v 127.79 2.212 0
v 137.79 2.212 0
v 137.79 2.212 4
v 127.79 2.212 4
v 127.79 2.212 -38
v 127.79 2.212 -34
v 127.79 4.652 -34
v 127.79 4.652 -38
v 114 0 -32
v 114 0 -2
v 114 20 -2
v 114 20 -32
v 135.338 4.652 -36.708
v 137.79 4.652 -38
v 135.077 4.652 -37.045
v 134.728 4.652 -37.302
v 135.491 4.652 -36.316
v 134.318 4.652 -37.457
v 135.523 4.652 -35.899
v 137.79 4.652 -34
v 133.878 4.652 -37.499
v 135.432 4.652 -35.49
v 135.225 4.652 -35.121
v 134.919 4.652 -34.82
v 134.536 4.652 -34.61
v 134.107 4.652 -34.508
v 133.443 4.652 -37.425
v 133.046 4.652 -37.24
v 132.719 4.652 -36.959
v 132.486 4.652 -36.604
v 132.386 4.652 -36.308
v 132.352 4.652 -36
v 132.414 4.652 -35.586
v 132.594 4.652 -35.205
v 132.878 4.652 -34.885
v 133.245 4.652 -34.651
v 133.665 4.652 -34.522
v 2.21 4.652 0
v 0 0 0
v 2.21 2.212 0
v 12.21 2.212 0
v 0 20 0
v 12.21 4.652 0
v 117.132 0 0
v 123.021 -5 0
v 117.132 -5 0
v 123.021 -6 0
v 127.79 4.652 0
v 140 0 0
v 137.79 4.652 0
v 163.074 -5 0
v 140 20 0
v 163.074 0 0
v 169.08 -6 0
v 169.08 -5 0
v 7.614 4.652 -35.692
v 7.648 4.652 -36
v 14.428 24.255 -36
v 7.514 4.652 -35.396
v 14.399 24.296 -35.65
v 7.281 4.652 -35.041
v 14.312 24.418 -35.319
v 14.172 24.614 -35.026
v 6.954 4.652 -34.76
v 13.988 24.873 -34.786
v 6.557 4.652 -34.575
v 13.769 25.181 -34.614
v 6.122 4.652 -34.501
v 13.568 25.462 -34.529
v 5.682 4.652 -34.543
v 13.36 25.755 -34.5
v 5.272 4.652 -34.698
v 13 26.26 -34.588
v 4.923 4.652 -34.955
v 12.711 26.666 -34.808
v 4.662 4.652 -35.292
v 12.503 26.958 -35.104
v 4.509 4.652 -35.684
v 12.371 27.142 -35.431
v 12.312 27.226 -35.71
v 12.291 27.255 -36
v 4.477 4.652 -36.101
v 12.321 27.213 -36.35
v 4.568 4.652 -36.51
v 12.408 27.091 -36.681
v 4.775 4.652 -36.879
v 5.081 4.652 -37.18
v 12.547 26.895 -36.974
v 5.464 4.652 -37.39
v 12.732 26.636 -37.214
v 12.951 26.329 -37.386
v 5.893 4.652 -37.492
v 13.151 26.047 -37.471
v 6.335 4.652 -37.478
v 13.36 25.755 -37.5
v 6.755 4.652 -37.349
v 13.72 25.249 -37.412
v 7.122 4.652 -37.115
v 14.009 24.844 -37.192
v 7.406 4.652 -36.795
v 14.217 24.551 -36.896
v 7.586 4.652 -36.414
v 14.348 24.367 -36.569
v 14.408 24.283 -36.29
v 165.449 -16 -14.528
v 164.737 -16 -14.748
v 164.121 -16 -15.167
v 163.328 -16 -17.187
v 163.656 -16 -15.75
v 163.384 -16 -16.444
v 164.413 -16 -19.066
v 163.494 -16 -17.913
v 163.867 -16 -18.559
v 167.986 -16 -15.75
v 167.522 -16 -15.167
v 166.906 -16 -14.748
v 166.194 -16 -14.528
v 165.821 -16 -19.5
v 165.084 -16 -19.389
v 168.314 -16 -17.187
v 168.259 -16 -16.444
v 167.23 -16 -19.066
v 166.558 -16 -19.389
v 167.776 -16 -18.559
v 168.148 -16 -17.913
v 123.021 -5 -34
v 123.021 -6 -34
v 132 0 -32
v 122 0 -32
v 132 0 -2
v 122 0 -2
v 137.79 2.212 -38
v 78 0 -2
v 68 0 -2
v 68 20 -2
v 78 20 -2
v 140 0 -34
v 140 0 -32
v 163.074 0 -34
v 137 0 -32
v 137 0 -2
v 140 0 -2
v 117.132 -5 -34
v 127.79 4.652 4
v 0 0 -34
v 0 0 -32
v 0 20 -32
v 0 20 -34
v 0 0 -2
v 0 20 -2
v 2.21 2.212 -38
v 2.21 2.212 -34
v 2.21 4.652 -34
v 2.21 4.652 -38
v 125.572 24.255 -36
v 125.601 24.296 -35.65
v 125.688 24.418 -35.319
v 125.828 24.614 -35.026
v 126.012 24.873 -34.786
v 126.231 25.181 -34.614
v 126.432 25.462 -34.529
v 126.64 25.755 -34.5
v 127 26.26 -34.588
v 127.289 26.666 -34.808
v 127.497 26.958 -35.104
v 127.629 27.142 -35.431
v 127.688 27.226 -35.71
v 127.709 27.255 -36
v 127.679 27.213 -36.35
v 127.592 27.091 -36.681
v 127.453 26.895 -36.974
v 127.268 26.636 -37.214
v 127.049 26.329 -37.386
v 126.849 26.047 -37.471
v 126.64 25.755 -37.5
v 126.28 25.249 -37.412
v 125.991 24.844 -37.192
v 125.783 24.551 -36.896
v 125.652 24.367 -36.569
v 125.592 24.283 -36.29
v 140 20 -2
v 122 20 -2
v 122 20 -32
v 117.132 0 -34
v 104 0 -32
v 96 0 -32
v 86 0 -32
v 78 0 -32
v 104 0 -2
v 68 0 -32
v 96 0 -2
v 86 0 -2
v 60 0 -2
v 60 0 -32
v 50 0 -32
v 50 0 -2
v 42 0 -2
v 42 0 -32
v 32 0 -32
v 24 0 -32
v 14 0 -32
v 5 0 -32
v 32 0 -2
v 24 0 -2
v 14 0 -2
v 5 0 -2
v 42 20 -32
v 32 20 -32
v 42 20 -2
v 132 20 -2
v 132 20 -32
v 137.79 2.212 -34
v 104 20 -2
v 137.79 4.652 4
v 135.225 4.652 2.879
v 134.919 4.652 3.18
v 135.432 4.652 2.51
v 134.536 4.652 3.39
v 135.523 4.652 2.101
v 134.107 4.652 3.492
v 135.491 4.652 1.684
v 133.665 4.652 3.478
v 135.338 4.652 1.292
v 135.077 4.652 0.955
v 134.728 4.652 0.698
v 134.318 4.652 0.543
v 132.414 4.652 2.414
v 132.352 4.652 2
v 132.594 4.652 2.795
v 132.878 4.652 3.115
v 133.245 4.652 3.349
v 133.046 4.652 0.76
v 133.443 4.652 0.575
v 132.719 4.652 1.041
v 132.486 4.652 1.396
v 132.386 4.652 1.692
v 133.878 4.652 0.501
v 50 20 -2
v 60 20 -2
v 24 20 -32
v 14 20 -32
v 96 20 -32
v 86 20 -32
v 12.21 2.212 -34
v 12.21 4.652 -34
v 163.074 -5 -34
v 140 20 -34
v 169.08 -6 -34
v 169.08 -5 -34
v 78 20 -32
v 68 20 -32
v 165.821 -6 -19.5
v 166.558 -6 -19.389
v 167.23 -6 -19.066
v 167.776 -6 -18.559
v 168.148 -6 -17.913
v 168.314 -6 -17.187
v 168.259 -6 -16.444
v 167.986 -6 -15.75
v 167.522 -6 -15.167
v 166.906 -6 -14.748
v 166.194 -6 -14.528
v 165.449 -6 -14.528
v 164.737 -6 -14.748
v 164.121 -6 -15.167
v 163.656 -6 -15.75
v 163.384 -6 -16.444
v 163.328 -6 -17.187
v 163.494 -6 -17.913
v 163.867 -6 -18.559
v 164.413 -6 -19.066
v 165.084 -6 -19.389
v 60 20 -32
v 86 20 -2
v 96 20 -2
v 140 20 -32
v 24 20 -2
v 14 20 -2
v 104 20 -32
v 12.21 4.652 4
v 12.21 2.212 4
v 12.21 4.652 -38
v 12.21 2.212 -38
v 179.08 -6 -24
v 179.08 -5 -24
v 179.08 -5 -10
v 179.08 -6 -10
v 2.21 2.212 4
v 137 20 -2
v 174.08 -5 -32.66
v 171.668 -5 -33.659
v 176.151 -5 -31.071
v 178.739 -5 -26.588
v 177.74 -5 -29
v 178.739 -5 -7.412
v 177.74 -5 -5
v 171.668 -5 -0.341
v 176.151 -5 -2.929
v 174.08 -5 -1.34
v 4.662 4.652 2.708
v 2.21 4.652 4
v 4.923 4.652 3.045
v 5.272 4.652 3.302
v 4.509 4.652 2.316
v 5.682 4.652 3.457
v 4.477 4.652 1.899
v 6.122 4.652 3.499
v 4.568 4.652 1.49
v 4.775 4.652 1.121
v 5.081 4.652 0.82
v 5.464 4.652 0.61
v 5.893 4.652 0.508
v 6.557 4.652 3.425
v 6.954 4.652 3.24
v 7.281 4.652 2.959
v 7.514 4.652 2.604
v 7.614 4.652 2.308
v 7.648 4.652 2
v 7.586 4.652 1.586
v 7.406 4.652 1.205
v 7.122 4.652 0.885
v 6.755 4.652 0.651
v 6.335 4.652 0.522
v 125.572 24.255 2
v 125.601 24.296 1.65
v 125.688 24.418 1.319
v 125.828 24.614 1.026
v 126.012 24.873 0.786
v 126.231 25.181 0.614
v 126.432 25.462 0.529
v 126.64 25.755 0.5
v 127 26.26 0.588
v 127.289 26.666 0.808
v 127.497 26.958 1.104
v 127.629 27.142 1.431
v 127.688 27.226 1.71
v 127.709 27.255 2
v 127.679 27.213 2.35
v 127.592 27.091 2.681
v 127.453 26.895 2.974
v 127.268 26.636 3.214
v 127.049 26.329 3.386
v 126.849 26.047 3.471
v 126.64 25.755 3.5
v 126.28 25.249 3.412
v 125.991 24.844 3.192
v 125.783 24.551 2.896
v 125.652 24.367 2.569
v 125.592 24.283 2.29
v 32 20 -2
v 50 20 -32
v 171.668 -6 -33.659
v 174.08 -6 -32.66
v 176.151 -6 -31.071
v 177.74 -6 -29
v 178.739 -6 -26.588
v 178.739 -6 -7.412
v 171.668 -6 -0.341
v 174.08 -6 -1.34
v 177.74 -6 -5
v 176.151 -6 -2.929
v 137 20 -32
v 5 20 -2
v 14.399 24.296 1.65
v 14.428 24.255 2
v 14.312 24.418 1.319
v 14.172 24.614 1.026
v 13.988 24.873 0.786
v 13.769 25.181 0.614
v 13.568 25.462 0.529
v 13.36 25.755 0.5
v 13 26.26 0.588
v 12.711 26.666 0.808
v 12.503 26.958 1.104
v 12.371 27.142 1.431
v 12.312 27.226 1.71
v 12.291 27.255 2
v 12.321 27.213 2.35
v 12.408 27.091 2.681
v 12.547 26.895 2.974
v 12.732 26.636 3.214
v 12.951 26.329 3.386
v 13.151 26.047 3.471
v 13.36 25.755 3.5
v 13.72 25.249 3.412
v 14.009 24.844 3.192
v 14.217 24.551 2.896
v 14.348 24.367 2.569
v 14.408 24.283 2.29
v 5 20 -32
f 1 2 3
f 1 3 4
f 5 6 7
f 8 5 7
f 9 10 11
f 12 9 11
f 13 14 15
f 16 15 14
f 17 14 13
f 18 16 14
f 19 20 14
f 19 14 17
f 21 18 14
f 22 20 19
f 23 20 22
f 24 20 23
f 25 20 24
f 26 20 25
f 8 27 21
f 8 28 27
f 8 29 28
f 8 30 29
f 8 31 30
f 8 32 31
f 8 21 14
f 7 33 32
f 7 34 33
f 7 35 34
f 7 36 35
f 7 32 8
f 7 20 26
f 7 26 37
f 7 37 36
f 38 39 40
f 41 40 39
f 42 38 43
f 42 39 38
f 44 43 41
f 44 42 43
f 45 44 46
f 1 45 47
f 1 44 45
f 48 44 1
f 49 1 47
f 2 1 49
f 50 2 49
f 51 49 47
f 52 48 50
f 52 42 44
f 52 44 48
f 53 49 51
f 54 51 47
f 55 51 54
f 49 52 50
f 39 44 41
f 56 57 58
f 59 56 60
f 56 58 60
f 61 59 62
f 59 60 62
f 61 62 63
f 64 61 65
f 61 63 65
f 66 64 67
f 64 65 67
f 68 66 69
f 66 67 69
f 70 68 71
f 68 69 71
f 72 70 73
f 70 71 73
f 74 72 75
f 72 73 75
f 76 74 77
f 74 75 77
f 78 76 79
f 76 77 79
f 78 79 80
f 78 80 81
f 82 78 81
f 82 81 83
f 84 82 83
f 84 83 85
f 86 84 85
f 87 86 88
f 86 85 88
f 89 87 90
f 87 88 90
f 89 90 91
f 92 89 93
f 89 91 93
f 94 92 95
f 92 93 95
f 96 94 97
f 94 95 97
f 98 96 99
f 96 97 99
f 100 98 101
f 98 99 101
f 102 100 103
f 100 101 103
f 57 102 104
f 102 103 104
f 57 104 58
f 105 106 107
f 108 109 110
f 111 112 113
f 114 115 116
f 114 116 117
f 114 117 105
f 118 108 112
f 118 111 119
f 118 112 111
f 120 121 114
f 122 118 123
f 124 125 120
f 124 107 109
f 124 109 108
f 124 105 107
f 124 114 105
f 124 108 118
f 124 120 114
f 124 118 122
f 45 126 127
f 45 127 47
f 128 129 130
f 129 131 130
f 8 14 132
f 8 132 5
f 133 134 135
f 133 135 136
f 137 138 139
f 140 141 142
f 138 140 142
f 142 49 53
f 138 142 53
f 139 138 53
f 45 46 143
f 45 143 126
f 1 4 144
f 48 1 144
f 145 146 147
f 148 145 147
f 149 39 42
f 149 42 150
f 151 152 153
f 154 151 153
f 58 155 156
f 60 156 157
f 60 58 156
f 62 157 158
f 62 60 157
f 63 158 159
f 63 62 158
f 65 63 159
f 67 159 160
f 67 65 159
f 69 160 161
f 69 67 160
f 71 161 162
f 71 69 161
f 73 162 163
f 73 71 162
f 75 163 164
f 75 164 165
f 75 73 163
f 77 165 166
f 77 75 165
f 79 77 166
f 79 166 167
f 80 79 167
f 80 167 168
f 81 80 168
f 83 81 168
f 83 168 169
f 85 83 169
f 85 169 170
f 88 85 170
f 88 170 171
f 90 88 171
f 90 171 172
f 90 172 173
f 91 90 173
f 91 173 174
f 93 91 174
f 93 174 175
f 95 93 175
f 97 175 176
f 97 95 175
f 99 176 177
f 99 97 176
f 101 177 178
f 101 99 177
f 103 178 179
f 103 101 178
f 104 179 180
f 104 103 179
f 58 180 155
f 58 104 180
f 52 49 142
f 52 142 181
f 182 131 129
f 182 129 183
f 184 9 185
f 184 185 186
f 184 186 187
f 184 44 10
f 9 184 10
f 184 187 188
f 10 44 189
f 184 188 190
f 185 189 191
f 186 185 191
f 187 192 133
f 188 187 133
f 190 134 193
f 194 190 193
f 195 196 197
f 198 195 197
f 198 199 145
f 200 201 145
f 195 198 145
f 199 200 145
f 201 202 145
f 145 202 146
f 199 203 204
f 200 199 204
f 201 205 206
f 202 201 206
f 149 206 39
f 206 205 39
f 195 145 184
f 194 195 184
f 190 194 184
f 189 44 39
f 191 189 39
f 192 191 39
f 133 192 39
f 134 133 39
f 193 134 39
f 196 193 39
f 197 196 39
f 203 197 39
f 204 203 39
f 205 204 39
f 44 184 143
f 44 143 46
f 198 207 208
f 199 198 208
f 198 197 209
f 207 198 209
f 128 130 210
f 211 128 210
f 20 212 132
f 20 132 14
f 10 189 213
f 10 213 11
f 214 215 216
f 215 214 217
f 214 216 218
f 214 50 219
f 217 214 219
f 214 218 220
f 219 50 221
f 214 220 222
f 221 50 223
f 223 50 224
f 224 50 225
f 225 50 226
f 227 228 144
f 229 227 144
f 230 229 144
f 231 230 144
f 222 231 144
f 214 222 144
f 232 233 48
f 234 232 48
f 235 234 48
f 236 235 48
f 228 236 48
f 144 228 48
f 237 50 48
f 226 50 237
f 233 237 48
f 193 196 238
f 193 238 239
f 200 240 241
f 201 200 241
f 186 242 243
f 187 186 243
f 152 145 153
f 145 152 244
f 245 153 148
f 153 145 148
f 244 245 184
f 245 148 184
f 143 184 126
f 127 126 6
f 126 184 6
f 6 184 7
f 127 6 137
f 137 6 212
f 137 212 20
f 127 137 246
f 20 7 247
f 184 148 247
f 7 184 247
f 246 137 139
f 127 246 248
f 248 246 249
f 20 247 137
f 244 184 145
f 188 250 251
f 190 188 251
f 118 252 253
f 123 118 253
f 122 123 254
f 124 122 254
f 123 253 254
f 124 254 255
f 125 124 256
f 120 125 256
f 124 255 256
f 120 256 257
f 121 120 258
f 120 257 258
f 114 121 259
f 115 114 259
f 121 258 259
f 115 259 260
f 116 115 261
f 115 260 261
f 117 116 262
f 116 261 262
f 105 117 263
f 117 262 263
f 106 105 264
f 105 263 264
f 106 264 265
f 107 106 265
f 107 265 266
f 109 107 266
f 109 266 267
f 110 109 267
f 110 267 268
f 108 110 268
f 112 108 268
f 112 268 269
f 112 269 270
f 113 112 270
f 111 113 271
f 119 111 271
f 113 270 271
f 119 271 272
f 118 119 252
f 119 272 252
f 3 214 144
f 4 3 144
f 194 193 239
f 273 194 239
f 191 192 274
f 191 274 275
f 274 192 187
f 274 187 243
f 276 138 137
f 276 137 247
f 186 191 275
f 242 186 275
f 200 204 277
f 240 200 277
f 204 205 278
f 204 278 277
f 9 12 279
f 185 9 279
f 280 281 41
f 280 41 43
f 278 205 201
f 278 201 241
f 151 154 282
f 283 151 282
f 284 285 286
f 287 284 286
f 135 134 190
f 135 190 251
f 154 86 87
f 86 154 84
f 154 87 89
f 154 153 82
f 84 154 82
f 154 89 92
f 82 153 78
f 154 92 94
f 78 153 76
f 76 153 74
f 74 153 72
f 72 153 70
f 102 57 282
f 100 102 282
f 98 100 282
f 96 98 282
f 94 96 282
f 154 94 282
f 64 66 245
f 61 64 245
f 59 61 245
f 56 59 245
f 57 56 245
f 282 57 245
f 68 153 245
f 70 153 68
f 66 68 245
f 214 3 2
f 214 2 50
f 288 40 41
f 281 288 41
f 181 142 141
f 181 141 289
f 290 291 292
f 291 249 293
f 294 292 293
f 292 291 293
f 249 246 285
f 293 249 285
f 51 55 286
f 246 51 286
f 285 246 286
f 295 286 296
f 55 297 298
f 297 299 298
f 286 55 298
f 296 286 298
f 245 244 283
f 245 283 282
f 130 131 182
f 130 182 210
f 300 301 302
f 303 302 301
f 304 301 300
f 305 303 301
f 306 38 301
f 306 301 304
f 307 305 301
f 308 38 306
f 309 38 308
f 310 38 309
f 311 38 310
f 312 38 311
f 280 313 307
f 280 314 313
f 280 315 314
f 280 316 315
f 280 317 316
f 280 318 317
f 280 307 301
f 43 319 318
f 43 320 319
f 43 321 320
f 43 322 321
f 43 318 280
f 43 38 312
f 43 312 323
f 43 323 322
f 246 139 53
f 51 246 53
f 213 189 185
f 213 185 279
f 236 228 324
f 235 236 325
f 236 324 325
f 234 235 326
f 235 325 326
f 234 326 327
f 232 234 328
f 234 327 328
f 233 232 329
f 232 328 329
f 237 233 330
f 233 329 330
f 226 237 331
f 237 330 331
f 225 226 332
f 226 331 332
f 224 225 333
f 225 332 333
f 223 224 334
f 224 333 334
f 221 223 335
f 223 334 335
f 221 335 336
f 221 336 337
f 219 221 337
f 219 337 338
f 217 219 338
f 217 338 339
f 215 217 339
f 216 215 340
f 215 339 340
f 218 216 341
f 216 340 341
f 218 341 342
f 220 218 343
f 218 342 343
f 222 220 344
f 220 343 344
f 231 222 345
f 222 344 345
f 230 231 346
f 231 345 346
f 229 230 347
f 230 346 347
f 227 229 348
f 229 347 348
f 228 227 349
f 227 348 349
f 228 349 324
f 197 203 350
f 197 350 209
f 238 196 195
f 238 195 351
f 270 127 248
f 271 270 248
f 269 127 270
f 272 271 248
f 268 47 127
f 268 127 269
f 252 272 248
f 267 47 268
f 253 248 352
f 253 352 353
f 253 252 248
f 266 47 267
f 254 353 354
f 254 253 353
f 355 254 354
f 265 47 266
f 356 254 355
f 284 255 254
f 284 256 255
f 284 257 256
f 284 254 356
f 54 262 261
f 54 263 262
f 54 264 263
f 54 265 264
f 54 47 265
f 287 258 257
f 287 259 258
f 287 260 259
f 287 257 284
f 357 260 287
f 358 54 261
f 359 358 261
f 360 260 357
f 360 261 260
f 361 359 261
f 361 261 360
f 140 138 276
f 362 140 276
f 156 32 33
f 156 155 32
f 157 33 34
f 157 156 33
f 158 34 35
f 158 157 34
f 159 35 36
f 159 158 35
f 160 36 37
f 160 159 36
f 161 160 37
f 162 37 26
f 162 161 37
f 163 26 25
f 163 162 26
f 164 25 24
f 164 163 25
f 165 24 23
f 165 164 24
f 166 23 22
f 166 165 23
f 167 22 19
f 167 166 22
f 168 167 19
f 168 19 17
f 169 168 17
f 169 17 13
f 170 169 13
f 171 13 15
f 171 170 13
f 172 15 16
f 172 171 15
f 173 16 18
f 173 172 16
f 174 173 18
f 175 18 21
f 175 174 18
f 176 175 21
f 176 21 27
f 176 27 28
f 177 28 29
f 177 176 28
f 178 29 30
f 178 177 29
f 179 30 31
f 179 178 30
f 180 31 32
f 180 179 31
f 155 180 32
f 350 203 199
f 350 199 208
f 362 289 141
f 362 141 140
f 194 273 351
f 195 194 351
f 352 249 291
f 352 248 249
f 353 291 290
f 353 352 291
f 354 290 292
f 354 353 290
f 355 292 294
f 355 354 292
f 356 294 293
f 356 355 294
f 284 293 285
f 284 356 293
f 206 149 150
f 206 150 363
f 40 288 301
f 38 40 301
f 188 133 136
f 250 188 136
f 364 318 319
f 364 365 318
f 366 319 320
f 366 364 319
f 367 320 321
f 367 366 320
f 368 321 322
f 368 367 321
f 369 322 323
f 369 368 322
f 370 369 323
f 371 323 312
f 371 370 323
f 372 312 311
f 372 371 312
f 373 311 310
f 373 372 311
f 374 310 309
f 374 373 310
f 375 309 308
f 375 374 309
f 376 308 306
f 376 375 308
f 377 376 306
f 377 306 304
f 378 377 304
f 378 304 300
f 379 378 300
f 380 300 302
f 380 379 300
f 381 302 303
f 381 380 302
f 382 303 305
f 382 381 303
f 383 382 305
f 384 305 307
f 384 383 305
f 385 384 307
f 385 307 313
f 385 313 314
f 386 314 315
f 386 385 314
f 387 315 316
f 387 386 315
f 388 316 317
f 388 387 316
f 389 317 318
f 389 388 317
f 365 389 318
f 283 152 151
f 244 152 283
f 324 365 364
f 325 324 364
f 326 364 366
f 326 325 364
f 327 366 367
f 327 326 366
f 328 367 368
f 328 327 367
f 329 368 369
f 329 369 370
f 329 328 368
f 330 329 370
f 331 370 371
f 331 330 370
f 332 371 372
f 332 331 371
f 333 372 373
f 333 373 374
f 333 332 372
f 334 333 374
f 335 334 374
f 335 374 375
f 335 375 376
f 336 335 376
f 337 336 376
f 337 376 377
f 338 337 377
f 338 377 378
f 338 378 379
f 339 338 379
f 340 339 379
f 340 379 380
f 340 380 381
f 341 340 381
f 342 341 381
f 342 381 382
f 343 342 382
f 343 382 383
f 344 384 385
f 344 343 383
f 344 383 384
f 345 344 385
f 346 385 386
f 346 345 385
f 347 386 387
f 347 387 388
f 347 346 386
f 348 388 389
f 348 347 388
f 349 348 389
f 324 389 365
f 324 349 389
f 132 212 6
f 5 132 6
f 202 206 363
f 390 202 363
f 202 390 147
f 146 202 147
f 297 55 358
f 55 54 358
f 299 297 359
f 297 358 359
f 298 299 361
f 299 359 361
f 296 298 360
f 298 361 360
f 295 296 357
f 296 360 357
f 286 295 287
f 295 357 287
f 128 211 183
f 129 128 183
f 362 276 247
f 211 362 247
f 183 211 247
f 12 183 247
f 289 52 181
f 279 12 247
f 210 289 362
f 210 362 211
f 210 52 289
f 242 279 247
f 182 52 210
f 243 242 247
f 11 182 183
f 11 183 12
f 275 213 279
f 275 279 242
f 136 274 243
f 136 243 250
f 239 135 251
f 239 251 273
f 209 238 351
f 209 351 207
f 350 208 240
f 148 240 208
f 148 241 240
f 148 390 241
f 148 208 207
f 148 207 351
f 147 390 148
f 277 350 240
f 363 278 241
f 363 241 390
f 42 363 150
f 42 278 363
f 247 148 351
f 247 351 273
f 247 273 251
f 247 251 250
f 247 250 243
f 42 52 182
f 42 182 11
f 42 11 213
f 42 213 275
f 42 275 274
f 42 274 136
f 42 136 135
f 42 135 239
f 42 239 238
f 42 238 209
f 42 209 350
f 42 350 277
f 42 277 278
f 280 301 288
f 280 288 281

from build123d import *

# Parameters (mm, degrees)
SKETCH1_W                = 140
SKETCH1_H                = 2
BOSS_EXTRUDE3_DEPTH      = 20
SKETCH3_W                = 8
SKETCH3_H                = 20
SKETCH3_W_2              = 9
BOSS_EXTRUDE4_DEPTH      = 30
SKETCH4_W                = 140
SKETCH4_H                = 20
BOSS_EXTRUDE6_DEPTH      = 2
SKETCH6_W                = 30
SKETCH6_H                = 20
CUT_EXTRUDE4_DEPTH       = 3
SKETCH8_W                = 45.941462796
SKETCH8_H                = 34
BOSS_EXTRUDE7_DEPTH      = 5
SKETCH9_W                = 10
SKETCH9_H                = 2.440826928
BOSS_EXTRUDE8_DEPTH      = 4
SWEEP4_PROFILE_R         = 1.5
MIRROR10_COPY_1_SKETCH_W = 10
MIRROR10_COPY_1_SKETCH_H = 2.440826928
MIRROR10_COPY_1_DEPTH    = 4
MIRROR10_COPY_2_SKETCH_R = 1.5
SKETCH75_W               = 56.059600345
SKETCH75_H               = 34
BOSS_EXTRUDE11_DEPTH     = 1
SKETCH84_R               = 2.5
BOSS_EXTRUDE12_DEPTH     = 10
FILLET1_R                = 10


with BuildPart() as part:
    # Sketch1 → Boss-Extrude3 (new body)
    with BuildSketch(Plane(origin=(0, 0, 0), x_dir=(1, 0, 0), z_dir=(0, 1, 0))):
        with Locations((70, 1)):
            Rectangle(SKETCH1_W, SKETCH1_H)
    extrude(amount=BOSS_EXTRUDE3_DEPTH)

    # Sketch3 → Boss-Extrude4 (add)
    with BuildSketch(Plane(origin=(0, 0, -2), x_dir=(-1, 0, 0), z_dir=(0, 0, -1))):
        with Locations((-136, 10)):
            Rectangle(SKETCH3_W, SKETCH3_H)
        with Locations((-118, 10)):
            Rectangle(SKETCH3_W, SKETCH3_H)
        with Locations((-100, 10)):
            Rectangle(SKETCH3_W, SKETCH3_H)
        with Locations((-82, 10)):
            Rectangle(SKETCH3_W, SKETCH3_H)
        with Locations((-64, 10)):
            Rectangle(SKETCH3_W, SKETCH3_H)
        with Locations((-46, 10)):
            Rectangle(SKETCH3_W, SKETCH3_H)
        with Locations((-28, 10)):
            Rectangle(SKETCH3_W, SKETCH3_H)
        with Locations((-9.5, 10)):
            Rectangle(SKETCH3_W_2, SKETCH3_H)
    extrude(amount=BOSS_EXTRUDE4_DEPTH)

    # Sketch4 → Boss-Extrude6 (add)
    with BuildSketch(Plane(origin=(0, 0, -32), x_dir=(-1, 0, 0), z_dir=(0, 0, -1))):
        with Locations((-70, 10)):
            Rectangle(SKETCH4_W, SKETCH4_H)
    extrude(amount=BOSS_EXTRUDE6_DEPTH)

    # Sketch6 → Cut-Extrude4 (cut)
    with BuildSketch(Plane(origin=(140, 0, 0), x_dir=(0, 0, -1), z_dir=(1, 0, 0))):
        with Locations((17, 10)):
            Rectangle(SKETCH6_W, SKETCH6_H)
    extrude(amount=-CUT_EXTRUDE4_DEPTH, mode=Mode.SUBTRACT)

    # Sketch8 → Boss-Extrude7 (add)
    with BuildSketch(Plane.XZ):
        with Locations((140.102979593, -17)):
            Rectangle(SKETCH8_W, SKETCH8_H)
    extrude(amount=BOSS_EXTRUDE7_DEPTH)

    # Sketch9 → Boss-Extrude8 (add)
    with BuildSketch(Plane.XY):
        with Locations((7.209980337, 3.43195512)):
            Rectangle(SKETCH9_W, SKETCH9_H)
    boss_extrude8 = extrude(amount=BOSS_EXTRUDE8_DEPTH)

    # Sweep4: sweep along a path in Sketch35
    with BuildLine(Plane.XY.offset(2)) as sweep4_path:
        Line((5.644054271, 3.447454854), (13.359758823, 25.754529488))
        Line((13.359758823, 25.754529488), (70, 25.754529488))
    # Sweep4 profile (on start of the path) → Sweep4 (sweep)
    with BuildSketch(Plane(origin=(5.644054271, 3.447454854, 2), x_dir=(0.9450642967083543, -0.3268844980832583, 0), z_dir=(0.3268844980832583, 0.9450642967083543, 0))):
        Circle(SWEEP4_PROFILE_R)
    sweep4 = sweep(path=sweep4_path.line, transition=Transition.RIGHT)

    # Mirror9: Boss-Extrude8, Sweep4 across plane
    add(boss_extrude8.mirror(Plane(origin=(70, 0, 0), x_dir=(0, 0, 1), z_dir=(1, 0, 0))))
    add(sweep4.mirror(Plane(origin=(70, 0, 0), x_dir=(0, 0, 1), z_dir=(1, 0, 0))))

    # Mirror10: Boss-Extrude8, Sweep4 across plane
    add(boss_extrude8.mirror(Plane.XY.offset(-17)))
    add(sweep4.mirror(Plane.XY.offset(-17)))

    # Mirror10 copy 1 sketch → Mirror10 copy 1 (add)
    with BuildSketch(Plane(origin=(140, 0, -34), x_dir=(-1, 0, 0), z_dir=(0, 0, -1))):
        with Locations((7.209980337, 3.43195512)):
            Rectangle(MIRROR10_COPY_1_SKETCH_W, MIRROR10_COPY_1_SKETCH_H)
    extrude(amount=MIRROR10_COPY_1_DEPTH)

    # Mirror10 copy 2: sweep along a path in Mirror10 copy 2 path
    with BuildLine(Plane(origin=(140, 0, -36), x_dir=(-1, 0, 0), z_dir=(0, 0, -1))) as mirror10_copy_2_path:
        Line((5.644054271, 3.447454854), (13.359758823, 25.754529488))
        Line((13.359758823, 25.754529488), (70, 25.754529488))
    # Mirror10 copy 2 sketch → Mirror10 copy 2 (sweep)
    with BuildSketch(Plane(origin=(134.355945729, 3.447454854, -36), x_dir=(-0.9450642967083543, -0.3268844980832583, 0), z_dir=(-0.3268844980832583, 0.9450642967083543, 0))):
        Circle(MIRROR10_COPY_2_SKETCH_R)
    sweep(path=mirror10_copy_2_path.line, transition=Transition.RIGHT)

    # Sketch75 → Boss-Extrude11 (add)
    with BuildSketch(Plane.XZ.offset(5)):
        with Locations((151.050400416, -17)):
            Rectangle(SKETCH75_W, SKETCH75_H)
    extrude(amount=BOSS_EXTRUDE11_DEPTH)

    # Sketch84 → Boss-Extrude12 (add)
    with BuildSketch(Plane.XZ.offset(6)):
        with Locations(Location((165.821290963, -17, 0), (0, 0, 270))):
            Circle(SKETCH84_R)
    extrude(amount=BOSS_EXTRUDE12_DEPTH)

    # Fillet1
    fillet1_edges = [part.edges().sort_by_distance(p)[0] for p in [
        (179.080200588, -5.5, -34),
        (179.080200588, -5.5, 0),
    ]]
    fillet(fillet1_edges, radius=FILLET1_R)


solid = part.part
